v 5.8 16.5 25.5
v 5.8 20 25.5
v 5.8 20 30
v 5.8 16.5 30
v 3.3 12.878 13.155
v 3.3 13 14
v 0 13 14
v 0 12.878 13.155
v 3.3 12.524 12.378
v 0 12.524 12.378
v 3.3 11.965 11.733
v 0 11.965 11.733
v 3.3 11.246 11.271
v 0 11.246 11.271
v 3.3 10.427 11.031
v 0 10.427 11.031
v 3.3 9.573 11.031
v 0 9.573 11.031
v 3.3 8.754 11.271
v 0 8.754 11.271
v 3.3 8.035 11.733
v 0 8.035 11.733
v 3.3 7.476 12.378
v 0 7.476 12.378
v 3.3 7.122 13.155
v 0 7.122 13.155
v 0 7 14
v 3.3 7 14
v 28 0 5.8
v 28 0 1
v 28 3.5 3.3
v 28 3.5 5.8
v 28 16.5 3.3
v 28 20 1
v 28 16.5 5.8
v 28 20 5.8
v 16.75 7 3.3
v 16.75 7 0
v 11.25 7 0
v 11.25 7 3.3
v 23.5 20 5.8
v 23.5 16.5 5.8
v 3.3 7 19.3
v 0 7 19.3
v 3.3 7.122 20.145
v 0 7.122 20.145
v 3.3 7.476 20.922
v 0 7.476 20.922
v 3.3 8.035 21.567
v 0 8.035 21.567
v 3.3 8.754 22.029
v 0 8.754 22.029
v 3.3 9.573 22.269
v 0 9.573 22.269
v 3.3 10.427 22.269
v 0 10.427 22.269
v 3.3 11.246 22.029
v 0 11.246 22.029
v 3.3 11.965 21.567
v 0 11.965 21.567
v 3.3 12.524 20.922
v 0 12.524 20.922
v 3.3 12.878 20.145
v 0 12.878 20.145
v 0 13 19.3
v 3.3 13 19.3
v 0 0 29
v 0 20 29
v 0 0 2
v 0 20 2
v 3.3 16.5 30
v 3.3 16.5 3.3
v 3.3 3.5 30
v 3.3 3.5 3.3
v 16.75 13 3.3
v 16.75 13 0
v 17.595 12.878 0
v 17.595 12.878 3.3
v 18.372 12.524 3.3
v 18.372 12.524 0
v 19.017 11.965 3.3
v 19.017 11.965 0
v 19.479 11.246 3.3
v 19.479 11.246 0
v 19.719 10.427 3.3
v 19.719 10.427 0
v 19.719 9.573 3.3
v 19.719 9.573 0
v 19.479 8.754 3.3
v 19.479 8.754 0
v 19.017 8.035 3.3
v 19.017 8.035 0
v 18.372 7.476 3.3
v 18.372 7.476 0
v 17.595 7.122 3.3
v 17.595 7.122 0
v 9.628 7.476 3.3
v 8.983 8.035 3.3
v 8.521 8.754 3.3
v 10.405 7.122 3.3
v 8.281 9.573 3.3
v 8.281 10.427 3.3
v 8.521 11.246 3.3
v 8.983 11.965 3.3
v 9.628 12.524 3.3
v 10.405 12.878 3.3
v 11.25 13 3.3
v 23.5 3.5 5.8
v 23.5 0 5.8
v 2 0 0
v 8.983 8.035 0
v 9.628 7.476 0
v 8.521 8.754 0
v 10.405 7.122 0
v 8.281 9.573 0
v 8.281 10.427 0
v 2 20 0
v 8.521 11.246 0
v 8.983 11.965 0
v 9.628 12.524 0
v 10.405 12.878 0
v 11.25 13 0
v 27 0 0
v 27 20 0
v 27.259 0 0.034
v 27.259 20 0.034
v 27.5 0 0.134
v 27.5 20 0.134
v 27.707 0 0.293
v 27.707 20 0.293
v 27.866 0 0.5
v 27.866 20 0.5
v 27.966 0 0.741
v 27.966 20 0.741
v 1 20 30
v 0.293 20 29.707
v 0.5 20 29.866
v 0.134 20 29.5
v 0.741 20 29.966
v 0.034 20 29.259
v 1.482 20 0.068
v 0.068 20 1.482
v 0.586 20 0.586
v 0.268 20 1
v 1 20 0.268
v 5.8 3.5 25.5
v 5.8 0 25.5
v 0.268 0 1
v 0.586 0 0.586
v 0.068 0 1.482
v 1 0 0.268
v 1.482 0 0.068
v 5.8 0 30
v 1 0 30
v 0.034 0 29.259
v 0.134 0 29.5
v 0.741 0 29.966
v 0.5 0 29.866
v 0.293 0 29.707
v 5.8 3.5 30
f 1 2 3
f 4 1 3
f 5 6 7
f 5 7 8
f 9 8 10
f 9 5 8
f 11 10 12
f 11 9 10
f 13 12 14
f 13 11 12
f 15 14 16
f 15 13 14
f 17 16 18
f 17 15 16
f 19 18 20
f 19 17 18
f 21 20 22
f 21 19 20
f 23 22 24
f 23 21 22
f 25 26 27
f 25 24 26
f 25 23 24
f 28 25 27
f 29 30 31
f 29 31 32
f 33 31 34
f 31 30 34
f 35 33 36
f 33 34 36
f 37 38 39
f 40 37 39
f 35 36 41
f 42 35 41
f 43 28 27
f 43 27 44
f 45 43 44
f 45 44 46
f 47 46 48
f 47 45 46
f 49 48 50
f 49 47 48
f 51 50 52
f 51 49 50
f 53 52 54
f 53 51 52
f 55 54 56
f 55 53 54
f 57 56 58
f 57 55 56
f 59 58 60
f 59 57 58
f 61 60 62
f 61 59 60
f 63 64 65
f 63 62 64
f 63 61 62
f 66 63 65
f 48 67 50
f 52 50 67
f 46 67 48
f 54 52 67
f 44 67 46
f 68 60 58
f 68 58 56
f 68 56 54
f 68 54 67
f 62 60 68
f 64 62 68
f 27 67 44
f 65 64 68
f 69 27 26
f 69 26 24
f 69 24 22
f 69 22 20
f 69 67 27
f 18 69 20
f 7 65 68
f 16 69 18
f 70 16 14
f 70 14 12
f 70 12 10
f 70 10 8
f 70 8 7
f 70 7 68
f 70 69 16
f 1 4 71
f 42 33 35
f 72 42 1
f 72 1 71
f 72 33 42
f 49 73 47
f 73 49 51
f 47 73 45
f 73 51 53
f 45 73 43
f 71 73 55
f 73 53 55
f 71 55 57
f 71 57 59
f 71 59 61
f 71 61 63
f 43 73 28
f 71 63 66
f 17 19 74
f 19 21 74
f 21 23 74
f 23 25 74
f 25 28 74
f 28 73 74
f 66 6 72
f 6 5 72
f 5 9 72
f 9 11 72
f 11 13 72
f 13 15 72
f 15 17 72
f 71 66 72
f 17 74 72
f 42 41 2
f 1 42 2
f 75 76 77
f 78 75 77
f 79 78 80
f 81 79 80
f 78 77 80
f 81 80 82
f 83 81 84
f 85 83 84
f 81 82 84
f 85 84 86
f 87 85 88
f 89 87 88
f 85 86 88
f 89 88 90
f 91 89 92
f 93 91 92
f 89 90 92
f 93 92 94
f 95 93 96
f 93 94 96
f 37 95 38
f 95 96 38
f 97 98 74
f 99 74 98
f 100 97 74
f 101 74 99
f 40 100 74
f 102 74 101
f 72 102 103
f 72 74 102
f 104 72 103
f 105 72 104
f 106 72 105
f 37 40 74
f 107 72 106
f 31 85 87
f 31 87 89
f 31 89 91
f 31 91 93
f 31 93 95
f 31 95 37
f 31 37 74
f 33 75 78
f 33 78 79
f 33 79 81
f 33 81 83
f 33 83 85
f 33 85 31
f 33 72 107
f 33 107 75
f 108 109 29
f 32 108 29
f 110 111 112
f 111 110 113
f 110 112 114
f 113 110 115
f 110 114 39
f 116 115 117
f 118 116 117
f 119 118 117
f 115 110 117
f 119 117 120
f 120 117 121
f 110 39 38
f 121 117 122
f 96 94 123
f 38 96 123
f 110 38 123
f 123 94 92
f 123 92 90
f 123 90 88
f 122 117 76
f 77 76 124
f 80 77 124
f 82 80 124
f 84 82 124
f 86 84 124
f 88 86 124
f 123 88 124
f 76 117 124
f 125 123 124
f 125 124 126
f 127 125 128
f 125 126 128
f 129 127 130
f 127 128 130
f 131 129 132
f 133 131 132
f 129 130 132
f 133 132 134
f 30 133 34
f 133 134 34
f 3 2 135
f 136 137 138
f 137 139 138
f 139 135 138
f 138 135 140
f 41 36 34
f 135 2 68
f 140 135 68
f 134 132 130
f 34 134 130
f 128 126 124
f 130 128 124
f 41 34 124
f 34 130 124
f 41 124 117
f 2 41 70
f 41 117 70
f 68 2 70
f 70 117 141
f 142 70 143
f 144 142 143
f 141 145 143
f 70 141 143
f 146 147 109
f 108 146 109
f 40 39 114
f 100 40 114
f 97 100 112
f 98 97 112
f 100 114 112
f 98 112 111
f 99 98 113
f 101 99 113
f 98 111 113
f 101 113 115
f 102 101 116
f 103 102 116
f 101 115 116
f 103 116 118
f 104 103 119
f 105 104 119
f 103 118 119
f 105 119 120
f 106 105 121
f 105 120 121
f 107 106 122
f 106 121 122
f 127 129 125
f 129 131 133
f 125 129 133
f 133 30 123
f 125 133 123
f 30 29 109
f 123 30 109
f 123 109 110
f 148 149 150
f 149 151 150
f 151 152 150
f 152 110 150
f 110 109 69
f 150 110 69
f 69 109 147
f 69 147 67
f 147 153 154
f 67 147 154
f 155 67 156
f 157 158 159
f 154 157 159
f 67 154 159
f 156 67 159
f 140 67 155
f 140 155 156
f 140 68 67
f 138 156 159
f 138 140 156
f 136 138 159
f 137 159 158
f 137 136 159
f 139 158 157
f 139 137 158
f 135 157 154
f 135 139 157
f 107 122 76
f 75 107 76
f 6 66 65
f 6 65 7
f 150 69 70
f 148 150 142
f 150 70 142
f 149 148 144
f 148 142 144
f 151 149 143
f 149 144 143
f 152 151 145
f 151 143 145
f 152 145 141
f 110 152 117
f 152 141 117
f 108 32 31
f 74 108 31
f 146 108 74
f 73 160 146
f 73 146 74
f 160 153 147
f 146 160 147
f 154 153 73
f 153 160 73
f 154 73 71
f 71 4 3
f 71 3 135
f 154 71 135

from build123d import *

# Parameters (mm, degrees)
SKETCH1_W           = 28
SKETCH1_H           = 20
BOSS_EXTRUDE1_DEPTH = 3.3
SKETCH2_W           = 3.3
SKETCH2_H           = 20
BOSS_EXTRUDE2_DEPTH = 26.7
CUT_EXTRUDE1_DEPTH  = 44.704576419
BOSS_EXTRUDE3_DEPTH = 3.5
BOSS_EXTRUDE4_DEPTH = 3.5
FILLET1_R           = 2
FILLET2_R           = 1
FILLET3_R           = 1


with BuildPart() as part:
    # Sketch1 → Boss-Extrude1 (new body)
    with BuildSketch(Plane.XY):
        with Locations((14, 10)):
            Rectangle(SKETCH1_W, SKETCH1_H)
        with BuildLine():
            Line((11.25, 13), (16.75, 13))
            ThreePointArc((16.75, 13), (19.75, 10), (16.75, 7))
            Line((16.75, 7), (11.25, 7))
            ThreePointArc((11.25, 7), (8.25, 10), (11.25, 13))
        make_face(mode=Mode.SUBTRACT)
    extrude(amount=BOSS_EXTRUDE1_DEPTH)

    # Sketch2 → Boss-Extrude2 (add)
    with BuildSketch(Plane.XY.offset(3.3)):
        with Locations((1.65, 10)):
            Rectangle(SKETCH2_W, SKETCH2_H)
    extrude(amount=BOSS_EXTRUDE2_DEPTH)

    # Sketch3 → Cut-Extrude1 (cut, through all)
    with BuildSketch(Plane(origin=(3.3, 0, 0), x_dir=(0, 0, -1), z_dir=(1, 0, 0))):
        with BuildLine():
            Line((-19.3, 13), (-14, 13))
            ThreePointArc((-14, 13), (-11, 10), (-14, 7))
            Line((-14, 7), (-19.3, 7))
            ThreePointArc((-19.3, 7), (-22.3, 10), (-19.3, 13))
        make_face()
    extrude(amount=-CUT_EXTRUDE1_DEPTH, mode=Mode.SUBTRACT)

    # Sketch4 → Boss-Extrude3 (add)
    with BuildSketch(Plane.XZ):
        Polygon((3.3, 30), (5.8, 30), (5.8, 25.5), (23.5, 5.8), (28, 5.8), (28, 3.3), (3.3, 3.3), align=None)
    extrude(amount=-BOSS_EXTRUDE3_DEPTH)

    # Sketch5 → Boss-Extrude4 (add)
    with BuildSketch(Plane(origin=(0, 20, 0), x_dir=(1, 0, 0), z_dir=(0, 1, 0))):
        Polygon((28, -3.3), (28, -5.8), (23.5, -5.8), (5.8, -25.5), (5.8, -30), (3.3, -30), (3.3, -3.3), align=None)
    extrude(amount=-BOSS_EXTRUDE4_DEPTH)

    # Fillet1
    fillet1_edges = [part.edges().sort_by_distance(p)[0] for p in [
        (0, 10, 0),
    ]]
    fillet(fillet1_edges, radius=FILLET1_R)

    # Fillet2
    fillet2_edges = [part.edges().sort_by_distance(p)[0] for p in [
        (0, 10, 30),
    ]]
    fillet(fillet2_edges, radius=FILLET2_R)

    # Fillet3
    fillet3_edges = [part.edges().sort_by_distance(p)[0] for p in [
        (28, 10, 0),
    ]]
    fillet(fillet3_edges, radius=FILLET3_R)


solid = part.part
